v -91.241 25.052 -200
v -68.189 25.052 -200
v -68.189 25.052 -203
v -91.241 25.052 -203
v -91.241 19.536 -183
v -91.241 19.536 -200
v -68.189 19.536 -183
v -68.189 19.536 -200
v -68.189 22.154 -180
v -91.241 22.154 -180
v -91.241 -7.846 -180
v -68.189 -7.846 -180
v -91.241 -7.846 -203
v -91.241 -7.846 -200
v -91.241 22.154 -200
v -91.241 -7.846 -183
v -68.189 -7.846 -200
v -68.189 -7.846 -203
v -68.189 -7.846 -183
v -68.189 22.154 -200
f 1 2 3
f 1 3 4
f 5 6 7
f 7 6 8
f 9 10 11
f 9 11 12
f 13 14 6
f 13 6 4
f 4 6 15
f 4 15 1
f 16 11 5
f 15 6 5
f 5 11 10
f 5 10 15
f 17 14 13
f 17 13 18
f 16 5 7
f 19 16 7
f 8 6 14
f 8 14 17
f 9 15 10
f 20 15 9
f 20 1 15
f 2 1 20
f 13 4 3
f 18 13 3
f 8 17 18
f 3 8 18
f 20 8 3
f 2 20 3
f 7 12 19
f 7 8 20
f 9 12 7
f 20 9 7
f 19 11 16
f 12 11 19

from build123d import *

# Parameters (mm, degrees)
BOSS_EXTRUDE1_DEPTH = 3
SKETCH3_W           = 23.052059357
SKETCH3_H           = 2.618596089
BOSS_EXTRUDE2_DEPTH = 20
SKETCH5_W           = 23.052059357
SKETCH5_H           = 27.381403911
BOSS_EXTRUDE3_DEPTH = 3


with BuildPart() as part:
    # Sketch2 → Boss-Extrude1 (new body)
    with BuildSketch(Plane(origin=(0, 0, -200), x_dir=(-1, 0, 0), z_dir=(0, 0, -1))):
        Polygon((91.240837696, 22.154450262), (91.240837696, -7.845549738), (68.188778339, -7.845549738), (68.188778339, 22.154450262), (68.188778339, 25.05163022), (91.240837696, 25.05163022), align=None)
    extrude(amount=BOSS_EXTRUDE1_DEPTH)

    # Sketch3 → Boss-Extrude2 (add)
    with BuildSketch(Plane.XY.offset(-200)):
        with Locations((-79.714808018, 20.845152218)):
            Rectangle(SKETCH3_W, SKETCH3_H)
    extrude(amount=BOSS_EXTRUDE2_DEPTH)

    # Sketch5 → Boss-Extrude3 (add)
    with BuildSketch(Plane.XY.offset(-180)):
        with Locations((-79.714808018, 5.845152217)):
            Rectangle(SKETCH5_W, SKETCH5_H)
    extrude(amount=-BOSS_EXTRUDE3_DEPTH)


solid = part.part
